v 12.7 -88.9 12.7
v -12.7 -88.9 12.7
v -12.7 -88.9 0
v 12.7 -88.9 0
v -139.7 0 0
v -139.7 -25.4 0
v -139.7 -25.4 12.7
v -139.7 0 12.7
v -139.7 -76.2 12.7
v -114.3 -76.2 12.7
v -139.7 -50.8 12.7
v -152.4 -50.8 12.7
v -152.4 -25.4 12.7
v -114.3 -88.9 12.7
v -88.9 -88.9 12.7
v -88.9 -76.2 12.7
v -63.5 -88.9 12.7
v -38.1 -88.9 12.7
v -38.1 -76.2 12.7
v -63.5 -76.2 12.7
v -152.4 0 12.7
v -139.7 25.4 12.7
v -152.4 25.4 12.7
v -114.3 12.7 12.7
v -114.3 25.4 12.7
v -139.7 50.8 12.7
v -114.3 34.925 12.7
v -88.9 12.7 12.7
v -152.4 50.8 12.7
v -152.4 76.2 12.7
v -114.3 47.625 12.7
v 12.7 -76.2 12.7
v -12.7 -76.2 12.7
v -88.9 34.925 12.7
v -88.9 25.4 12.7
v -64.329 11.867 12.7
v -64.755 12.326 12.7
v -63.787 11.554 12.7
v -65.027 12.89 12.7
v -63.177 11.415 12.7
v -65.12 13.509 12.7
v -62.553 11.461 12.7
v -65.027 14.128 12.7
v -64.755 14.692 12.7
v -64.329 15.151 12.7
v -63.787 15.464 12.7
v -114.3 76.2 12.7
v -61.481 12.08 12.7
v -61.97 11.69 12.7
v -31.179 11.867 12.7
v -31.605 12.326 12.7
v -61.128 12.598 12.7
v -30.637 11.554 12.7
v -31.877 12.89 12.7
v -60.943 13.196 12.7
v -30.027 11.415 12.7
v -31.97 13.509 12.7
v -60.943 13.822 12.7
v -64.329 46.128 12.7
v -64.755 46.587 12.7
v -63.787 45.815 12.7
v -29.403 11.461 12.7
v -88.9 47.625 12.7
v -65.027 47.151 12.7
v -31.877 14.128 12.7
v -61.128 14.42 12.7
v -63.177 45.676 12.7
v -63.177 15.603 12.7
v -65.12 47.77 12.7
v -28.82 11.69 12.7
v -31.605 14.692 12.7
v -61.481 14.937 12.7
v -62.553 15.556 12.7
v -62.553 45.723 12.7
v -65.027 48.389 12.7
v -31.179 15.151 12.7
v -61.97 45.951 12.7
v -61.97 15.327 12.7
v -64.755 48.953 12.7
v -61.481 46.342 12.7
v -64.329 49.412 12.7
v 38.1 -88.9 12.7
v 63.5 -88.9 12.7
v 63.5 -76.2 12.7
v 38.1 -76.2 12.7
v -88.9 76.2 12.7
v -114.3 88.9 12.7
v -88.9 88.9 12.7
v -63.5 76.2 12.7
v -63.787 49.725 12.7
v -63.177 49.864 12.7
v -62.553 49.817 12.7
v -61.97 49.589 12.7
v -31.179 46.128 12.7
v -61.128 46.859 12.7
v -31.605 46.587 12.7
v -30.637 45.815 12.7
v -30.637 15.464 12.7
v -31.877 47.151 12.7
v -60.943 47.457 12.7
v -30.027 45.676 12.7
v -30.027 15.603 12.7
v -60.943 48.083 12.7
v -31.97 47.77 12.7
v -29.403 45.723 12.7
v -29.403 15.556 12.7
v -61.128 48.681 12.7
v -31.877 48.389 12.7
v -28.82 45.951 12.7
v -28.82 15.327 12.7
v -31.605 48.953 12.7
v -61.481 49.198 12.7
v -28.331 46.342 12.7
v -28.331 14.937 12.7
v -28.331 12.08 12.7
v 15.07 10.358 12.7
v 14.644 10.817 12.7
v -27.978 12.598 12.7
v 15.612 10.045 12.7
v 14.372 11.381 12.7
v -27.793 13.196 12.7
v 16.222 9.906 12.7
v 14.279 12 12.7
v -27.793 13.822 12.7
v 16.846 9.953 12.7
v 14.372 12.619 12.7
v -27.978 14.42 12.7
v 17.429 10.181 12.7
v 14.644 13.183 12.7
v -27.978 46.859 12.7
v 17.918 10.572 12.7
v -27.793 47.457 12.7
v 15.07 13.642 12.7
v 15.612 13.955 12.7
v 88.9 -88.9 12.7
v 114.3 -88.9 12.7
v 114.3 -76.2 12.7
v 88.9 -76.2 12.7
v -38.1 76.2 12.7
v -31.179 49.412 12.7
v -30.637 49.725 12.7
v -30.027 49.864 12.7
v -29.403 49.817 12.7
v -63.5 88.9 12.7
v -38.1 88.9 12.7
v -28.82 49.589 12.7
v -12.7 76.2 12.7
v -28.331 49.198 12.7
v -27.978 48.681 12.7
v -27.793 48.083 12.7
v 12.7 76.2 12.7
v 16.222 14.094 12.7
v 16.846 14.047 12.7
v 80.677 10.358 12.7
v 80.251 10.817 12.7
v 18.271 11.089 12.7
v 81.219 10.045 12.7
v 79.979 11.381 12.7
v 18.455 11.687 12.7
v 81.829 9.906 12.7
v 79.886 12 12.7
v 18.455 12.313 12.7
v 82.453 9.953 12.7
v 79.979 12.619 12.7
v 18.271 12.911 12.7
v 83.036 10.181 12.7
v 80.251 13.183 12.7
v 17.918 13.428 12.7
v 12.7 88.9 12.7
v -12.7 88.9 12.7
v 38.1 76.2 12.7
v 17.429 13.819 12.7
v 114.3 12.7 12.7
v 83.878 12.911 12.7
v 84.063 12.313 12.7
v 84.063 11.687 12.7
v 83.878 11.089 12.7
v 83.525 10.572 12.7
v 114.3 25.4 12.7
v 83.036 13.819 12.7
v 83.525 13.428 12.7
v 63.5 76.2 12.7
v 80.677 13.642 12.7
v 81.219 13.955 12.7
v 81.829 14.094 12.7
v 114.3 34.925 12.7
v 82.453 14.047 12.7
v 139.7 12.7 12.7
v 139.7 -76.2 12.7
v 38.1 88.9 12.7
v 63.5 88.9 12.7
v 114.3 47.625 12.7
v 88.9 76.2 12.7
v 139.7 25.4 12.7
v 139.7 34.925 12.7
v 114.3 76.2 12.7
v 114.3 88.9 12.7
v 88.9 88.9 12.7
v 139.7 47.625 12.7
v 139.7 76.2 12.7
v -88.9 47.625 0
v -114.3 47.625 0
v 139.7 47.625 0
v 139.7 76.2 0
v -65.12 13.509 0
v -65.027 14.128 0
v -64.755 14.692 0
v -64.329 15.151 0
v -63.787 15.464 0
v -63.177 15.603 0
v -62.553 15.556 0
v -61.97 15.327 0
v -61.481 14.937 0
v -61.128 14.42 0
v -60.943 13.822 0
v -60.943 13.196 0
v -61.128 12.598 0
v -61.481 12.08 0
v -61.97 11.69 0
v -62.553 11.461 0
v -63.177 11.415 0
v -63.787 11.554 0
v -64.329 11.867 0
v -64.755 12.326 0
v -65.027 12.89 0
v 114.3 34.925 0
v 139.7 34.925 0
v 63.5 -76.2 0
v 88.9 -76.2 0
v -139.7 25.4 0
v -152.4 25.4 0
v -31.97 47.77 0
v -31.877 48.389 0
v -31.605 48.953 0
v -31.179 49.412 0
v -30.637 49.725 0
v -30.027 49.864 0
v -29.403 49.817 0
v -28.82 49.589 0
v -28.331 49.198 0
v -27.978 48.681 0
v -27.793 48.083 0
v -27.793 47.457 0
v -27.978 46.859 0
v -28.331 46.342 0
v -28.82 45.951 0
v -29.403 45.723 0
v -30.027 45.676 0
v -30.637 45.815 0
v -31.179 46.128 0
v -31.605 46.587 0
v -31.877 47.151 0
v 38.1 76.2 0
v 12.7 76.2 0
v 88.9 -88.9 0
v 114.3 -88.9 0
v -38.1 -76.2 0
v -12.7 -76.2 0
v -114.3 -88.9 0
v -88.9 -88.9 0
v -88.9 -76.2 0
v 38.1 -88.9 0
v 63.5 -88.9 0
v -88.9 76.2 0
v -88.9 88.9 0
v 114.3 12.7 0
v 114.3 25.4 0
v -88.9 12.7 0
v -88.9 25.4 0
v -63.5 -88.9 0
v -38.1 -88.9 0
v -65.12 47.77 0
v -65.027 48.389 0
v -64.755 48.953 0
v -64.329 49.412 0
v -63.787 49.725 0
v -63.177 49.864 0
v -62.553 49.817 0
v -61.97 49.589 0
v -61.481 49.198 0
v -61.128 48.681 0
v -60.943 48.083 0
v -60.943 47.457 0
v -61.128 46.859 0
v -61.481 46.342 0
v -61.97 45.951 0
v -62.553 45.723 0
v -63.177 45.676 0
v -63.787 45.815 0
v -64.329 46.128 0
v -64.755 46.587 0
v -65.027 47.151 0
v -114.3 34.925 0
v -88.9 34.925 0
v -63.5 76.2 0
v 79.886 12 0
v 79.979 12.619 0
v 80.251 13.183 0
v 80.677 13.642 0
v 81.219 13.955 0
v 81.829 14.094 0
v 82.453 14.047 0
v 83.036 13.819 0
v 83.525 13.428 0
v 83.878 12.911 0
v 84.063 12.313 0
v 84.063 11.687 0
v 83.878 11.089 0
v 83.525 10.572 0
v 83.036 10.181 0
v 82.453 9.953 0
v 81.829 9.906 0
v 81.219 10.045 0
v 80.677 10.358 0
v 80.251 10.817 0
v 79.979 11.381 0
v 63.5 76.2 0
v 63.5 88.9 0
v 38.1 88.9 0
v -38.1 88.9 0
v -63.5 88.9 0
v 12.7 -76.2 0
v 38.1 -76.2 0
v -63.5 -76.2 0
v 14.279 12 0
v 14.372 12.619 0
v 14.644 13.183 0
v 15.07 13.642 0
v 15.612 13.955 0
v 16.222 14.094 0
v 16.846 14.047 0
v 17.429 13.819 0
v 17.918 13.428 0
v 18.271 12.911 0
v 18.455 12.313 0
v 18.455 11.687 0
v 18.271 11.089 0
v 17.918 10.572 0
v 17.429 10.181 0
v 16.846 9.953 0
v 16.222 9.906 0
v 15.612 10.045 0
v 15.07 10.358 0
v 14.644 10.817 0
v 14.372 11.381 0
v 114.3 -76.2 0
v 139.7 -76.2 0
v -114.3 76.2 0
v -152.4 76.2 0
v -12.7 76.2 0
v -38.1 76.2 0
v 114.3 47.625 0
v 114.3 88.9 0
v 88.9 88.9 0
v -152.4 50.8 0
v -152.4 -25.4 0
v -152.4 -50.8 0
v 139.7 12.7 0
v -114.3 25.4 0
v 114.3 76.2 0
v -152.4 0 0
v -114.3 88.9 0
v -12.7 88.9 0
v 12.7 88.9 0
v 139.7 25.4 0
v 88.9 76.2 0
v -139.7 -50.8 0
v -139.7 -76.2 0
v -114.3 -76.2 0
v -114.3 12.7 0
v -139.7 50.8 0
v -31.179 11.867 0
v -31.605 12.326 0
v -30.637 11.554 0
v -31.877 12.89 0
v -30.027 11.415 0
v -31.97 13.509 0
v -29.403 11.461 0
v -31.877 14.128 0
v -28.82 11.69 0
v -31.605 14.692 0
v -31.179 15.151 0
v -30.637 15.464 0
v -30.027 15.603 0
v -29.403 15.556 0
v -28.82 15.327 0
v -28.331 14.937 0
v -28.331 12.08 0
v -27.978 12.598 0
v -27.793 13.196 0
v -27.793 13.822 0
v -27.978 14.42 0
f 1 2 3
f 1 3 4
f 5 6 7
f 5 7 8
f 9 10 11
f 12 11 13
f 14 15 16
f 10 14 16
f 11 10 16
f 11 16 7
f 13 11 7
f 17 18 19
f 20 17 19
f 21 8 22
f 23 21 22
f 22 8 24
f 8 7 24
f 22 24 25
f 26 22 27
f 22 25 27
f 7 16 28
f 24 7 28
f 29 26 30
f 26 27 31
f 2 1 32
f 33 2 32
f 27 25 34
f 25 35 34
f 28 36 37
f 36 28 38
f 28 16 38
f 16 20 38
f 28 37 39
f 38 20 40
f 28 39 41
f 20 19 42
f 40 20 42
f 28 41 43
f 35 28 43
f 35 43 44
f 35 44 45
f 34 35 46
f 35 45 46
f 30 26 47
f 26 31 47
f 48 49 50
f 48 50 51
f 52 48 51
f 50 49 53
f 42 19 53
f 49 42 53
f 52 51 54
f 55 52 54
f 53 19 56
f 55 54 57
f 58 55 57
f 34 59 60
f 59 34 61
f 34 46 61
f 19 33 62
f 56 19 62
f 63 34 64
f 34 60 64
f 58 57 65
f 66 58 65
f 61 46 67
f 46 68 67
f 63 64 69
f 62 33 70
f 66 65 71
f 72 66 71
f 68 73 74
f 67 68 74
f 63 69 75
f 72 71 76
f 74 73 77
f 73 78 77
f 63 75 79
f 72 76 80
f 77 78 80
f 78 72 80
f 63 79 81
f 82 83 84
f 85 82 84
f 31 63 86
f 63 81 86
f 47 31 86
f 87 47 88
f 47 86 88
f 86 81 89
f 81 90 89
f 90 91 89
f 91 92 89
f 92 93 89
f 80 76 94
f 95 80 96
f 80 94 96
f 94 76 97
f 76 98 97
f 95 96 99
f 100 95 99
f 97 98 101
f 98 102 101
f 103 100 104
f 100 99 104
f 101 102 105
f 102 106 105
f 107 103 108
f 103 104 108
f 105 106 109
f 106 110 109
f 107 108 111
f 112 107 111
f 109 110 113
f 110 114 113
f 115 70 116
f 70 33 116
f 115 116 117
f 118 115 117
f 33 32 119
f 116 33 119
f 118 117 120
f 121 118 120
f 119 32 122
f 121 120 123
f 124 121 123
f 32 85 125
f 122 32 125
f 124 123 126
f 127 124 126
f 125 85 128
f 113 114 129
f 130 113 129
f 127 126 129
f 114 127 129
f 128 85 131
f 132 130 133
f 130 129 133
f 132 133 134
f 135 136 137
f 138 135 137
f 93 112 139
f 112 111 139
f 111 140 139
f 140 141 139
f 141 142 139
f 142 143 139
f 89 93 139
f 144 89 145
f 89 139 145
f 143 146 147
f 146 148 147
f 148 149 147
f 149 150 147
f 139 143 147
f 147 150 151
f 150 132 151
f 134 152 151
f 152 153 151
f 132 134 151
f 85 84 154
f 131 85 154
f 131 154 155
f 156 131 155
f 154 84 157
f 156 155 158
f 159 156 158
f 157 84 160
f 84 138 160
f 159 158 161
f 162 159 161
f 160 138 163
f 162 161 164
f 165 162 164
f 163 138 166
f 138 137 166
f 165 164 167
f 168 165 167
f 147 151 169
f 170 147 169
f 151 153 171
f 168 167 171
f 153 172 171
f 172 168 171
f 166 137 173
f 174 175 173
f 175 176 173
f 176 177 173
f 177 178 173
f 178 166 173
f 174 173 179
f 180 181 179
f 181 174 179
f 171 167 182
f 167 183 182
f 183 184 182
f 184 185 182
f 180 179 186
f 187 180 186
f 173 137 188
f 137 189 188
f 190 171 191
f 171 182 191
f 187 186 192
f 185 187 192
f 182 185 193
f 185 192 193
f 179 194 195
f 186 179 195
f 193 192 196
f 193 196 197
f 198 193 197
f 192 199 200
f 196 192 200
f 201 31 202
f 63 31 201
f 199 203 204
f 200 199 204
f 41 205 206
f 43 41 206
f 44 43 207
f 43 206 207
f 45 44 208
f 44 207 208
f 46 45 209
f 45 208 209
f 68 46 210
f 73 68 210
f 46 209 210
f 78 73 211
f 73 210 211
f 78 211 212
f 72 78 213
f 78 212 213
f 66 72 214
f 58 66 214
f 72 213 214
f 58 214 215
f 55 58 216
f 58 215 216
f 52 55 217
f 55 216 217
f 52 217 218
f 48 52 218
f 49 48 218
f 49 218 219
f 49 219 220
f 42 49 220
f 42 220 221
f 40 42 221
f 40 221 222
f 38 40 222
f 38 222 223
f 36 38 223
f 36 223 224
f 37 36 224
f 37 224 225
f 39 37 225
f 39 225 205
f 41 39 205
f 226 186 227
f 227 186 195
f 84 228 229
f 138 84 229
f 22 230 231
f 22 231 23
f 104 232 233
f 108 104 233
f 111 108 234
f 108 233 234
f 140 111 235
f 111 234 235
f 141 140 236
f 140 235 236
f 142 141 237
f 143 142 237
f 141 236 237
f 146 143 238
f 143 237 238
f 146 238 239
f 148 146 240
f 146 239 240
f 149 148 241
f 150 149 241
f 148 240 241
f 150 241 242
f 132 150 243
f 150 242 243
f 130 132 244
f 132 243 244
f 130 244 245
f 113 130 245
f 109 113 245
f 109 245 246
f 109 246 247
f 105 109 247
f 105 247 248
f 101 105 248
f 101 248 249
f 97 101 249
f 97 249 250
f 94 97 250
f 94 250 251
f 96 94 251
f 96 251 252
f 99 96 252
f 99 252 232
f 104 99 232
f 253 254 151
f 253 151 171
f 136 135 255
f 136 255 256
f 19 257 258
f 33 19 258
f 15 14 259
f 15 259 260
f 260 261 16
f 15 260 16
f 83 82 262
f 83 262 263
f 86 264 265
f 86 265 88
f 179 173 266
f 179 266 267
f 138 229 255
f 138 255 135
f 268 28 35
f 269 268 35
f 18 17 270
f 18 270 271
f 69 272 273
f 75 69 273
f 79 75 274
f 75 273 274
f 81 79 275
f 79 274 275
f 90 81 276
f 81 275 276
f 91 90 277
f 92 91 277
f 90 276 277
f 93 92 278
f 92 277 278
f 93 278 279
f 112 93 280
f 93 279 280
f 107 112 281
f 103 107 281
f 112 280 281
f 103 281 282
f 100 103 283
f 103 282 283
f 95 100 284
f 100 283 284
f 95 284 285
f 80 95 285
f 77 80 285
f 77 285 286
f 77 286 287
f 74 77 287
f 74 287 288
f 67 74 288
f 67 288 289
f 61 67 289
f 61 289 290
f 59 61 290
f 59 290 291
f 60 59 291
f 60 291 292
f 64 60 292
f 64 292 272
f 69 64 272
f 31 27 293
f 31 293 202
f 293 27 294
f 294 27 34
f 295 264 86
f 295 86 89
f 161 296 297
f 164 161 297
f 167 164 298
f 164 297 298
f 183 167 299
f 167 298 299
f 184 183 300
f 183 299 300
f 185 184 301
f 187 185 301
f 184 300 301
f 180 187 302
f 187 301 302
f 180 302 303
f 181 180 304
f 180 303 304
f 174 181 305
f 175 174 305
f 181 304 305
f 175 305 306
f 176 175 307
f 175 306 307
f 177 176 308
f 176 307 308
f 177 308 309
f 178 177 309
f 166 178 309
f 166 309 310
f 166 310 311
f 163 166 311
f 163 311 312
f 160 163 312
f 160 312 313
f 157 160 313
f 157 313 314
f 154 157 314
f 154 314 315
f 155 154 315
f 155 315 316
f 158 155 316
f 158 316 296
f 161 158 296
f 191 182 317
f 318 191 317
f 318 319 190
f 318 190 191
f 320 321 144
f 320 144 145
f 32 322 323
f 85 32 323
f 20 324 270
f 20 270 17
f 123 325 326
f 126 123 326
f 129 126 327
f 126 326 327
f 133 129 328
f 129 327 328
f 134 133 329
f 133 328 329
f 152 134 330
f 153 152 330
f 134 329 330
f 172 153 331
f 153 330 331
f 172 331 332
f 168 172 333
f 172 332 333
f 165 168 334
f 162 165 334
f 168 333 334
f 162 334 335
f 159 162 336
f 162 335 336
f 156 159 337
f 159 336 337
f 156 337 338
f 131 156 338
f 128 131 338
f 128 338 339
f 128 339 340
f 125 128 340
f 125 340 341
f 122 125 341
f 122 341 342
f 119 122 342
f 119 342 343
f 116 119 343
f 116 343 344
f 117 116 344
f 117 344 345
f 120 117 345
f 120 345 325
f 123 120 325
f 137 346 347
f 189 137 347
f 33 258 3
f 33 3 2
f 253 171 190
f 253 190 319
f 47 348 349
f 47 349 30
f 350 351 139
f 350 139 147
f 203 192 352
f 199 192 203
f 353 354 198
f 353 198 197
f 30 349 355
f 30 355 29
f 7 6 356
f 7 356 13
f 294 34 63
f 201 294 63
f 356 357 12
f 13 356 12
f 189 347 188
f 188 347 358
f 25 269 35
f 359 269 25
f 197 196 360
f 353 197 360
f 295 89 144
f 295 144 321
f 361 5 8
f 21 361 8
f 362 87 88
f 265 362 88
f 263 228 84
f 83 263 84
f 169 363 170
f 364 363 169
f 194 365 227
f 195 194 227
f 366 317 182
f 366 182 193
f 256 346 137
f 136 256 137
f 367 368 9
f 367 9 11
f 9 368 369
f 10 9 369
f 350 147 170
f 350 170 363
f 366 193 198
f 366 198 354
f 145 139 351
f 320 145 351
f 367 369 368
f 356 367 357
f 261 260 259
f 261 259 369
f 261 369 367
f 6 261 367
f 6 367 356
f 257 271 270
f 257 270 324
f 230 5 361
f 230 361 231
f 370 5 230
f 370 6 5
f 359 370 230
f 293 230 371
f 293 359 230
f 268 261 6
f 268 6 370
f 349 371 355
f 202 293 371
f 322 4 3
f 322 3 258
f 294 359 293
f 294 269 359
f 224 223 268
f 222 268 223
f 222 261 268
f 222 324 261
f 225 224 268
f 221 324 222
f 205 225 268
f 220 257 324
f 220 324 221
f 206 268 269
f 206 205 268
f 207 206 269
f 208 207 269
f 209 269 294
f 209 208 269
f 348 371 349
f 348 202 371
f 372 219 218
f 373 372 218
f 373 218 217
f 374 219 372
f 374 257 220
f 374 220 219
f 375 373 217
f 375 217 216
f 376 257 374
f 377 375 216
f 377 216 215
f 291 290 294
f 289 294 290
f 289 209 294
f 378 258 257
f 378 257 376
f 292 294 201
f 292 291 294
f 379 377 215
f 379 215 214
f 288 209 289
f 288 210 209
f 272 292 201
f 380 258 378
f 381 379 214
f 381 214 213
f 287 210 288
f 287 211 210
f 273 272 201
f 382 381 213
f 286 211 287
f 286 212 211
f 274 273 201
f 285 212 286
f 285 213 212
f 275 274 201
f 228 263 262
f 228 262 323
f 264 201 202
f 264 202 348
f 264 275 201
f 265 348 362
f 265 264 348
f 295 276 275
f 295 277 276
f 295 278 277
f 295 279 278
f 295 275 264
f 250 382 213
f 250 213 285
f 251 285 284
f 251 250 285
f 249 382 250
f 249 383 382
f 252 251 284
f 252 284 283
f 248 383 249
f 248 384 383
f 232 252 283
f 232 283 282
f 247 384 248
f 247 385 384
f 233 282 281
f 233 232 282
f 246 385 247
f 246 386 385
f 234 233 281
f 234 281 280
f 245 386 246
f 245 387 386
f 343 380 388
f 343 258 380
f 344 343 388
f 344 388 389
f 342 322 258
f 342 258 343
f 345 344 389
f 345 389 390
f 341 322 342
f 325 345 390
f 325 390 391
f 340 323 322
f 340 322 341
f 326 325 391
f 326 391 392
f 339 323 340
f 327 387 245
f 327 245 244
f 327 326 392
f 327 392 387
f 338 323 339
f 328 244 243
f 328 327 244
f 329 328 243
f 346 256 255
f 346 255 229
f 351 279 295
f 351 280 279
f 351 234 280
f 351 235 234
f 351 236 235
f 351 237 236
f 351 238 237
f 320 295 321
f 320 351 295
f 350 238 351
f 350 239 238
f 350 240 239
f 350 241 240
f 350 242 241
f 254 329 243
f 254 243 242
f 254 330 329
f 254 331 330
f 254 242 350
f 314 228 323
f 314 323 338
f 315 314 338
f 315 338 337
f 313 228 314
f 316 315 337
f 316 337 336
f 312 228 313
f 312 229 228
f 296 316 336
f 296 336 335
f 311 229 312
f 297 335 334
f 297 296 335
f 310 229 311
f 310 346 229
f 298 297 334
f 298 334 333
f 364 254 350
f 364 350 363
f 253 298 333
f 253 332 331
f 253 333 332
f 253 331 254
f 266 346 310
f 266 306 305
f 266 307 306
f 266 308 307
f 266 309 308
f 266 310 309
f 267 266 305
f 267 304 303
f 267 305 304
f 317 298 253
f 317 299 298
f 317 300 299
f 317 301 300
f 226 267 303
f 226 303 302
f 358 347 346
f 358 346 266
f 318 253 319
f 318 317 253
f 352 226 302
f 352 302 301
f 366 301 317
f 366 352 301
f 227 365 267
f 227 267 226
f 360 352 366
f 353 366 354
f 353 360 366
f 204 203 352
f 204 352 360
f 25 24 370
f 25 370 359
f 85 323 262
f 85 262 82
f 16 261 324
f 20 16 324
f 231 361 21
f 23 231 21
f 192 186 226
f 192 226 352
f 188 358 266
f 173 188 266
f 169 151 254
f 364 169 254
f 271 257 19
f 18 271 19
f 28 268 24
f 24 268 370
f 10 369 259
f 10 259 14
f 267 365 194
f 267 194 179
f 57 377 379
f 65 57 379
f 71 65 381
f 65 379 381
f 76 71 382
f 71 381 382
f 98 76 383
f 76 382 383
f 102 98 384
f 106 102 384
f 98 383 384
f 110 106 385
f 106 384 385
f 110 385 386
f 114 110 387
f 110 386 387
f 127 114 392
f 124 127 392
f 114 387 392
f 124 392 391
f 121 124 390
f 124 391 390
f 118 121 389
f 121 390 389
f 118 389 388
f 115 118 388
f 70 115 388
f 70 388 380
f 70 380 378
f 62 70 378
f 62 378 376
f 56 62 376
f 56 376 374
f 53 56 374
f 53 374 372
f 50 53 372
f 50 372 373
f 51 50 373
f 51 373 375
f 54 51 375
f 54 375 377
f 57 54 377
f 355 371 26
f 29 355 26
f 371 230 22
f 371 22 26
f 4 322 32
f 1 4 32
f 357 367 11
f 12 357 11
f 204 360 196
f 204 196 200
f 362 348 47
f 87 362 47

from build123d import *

# Parameters (mm, degrees)
SKETCH1_W               = 279.4
SKETCH1_H               = 152.4
BOSS_EXTRUDE1_DEPTH     = 12.7
SKETCH2_W               = 25.4
SKETCH2_H               = 12.7
BOSS_EXTRUDE2_DEPTH     = 12.7
LPATTERN1_COUNT         = 5
LPATTERN1_PITCH         = 50.8
MIRROR1_COPY_1_SKETCH_W = 25.4
MIRROR1_COPY_1_SKETCH_H = 12.7
MIRROR1_COPY_1_DEPTH    = 12.7
MIRROR1_COPY_2_SKETCH_W = 25.4
MIRROR1_COPY_2_SKETCH_H = 12.7
MIRROR1_COPY_2_DEPTH    = 12.7
MIRROR1_COPY_3_SKETCH_W = 25.4
MIRROR1_COPY_3_SKETCH_H = 12.7
MIRROR1_COPY_3_DEPTH    = 12.7
MIRROR1_COPY_4_SKETCH_W = 25.4
MIRROR1_COPY_4_SKETCH_H = 12.7
MIRROR1_COPY_4_DEPTH    = 12.7
SKETCH3_W               = 12.7
SKETCH3_H               = 25.4
BOSS_EXTRUDE3_DEPTH     = 12.7
LPATTERN2_COUNT         = 3
LPATTERN2_PITCH         = 50.8
SKETCH4_W               = 25.4
SKETCH4_H               = 12.7
CUT_EXTRUDE1_DEPTH      = 13.7
LPATTERN3_COUNT         = 2
LPATTERN3_PITCH         = 228.6
SKETCH5_W               = 25.4
SKETCH5_H               = 12.7
CUT_EXTRUDE2_DEPTH      = 13.7
LPATTERN4_COUNT         = 2
LPATTERN4_PITCH         = 228.6
SKETCH6_R               = 2.1
CUT_EXTRUDE3_DEPTH      = 13.7


with BuildPart() as part:
    # Sketch1 → Boss-Extrude1 (new body)
    with BuildSketch(Plane.XY):
        Rectangle(SKETCH1_W, SKETCH1_H)
    extrude(amount=BOSS_EXTRUDE1_DEPTH)

    # Sketch2 → Boss-Extrude2 (add)
    with BuildSketch(Plane.XZ.offset(76.2)):
        with Locations((-101.6, 6.35)):
            Rectangle(SKETCH2_W, SKETCH2_H)
    boss_extrude2 = extrude(amount=BOSS_EXTRUDE2_DEPTH)

    # LPattern1: Boss-Extrude2 ×5
    with Locations(*[(i * LPATTERN1_PITCH, 0, 0) for i in range(1, LPATTERN1_COUNT)]):
        add(boss_extrude2)

    # Mirror1: Boss-Extrude2 across plane
    add(boss_extrude2.mirror(Plane.ZX))

    # Mirror1 copy 1 sketch → Mirror1 copy 1 (add)
    with BuildSketch(Plane(origin=(50.8, 76.2, 0), x_dir=(1, 0, 0), z_dir=(0, 1, 0))):
        with Locations((-101.6, -6.35)):
            Rectangle(MIRROR1_COPY_1_SKETCH_W, MIRROR1_COPY_1_SKETCH_H)
    extrude(amount=MIRROR1_COPY_1_DEPTH)

    # Mirror1 copy 2 sketch → Mirror1 copy 2 (add)
    with BuildSketch(Plane(origin=(101.6, 76.2, 0), x_dir=(1, 0, 0), z_dir=(0, 1, 0))):
        with Locations((-101.6, -6.35)):
            Rectangle(MIRROR1_COPY_2_SKETCH_W, MIRROR1_COPY_2_SKETCH_H)
    extrude(amount=MIRROR1_COPY_2_DEPTH)

    # Mirror1 copy 3 sketch → Mirror1 copy 3 (add)
    with BuildSketch(Plane(origin=(152.4, 76.2, 0), x_dir=(1, 0, 0), z_dir=(0, 1, 0))):
        with Locations((-101.6, -6.35)):
            Rectangle(MIRROR1_COPY_3_SKETCH_W, MIRROR1_COPY_3_SKETCH_H)
    extrude(amount=MIRROR1_COPY_3_DEPTH)

    # Mirror1 copy 4 sketch → Mirror1 copy 4 (add)
    with BuildSketch(Plane(origin=(203.2, 76.2, 0), x_dir=(1, 0, 0), z_dir=(0, 1, 0))):
        with Locations((-101.6, -6.35)):
            Rectangle(MIRROR1_COPY_4_SKETCH_W, MIRROR1_COPY_4_SKETCH_H)
    extrude(amount=MIRROR1_COPY_4_DEPTH)

    # Sketch3 → Boss-Extrude3 (add)
    with BuildSketch(Plane.ZY.offset(139.7)):
        with Locations((6.35, 63.5)):
            Rectangle(SKETCH3_W, SKETCH3_H)
    boss_extrude3 = extrude(amount=BOSS_EXTRUDE3_DEPTH)

    # LPattern2: Boss-Extrude3 ×3
    with Locations(*[(0, -i * LPATTERN2_PITCH, 0) for i in range(1, LPATTERN2_COUNT)]):
        add(boss_extrude3)

    # Sketch4 → Cut-Extrude1 (cut, through all)
    with BuildSketch(Plane(origin=(0, 0, 0), x_dir=(-1, 0, 0), z_dir=(0, 0, -1))):
        with Locations((-127, 19.05)):
            Rectangle(SKETCH4_W, SKETCH4_H)
    cut_extrude1 = extrude(amount=-CUT_EXTRUDE1_DEPTH, mode=Mode.SUBTRACT)

    # LPattern3: Cut-Extrude1 ×2
    with Locations(*[(-i * LPATTERN3_PITCH, 0, 0) for i in range(1, LPATTERN3_COUNT)]):
        add(cut_extrude1, mode=Mode.SUBTRACT)

    # Sketch5 → Cut-Extrude2 (cut, through all)
    with BuildSketch(Plane.XY.offset(12.7)):
        with Locations((-101.6, 41.275)):
            Rectangle(SKETCH5_W, SKETCH5_H)
    cut_extrude2 = extrude(amount=-CUT_EXTRUDE2_DEPTH, mode=Mode.SUBTRACT)

    # LPattern4: Cut-Extrude2 ×2
    with Locations(*[(i * LPATTERN4_PITCH, 0, 0) for i in range(1, LPATTERN4_COUNT)]):
        add(cut_extrude2, mode=Mode.SUBTRACT)

    # Sketch6 → Cut-Extrude3 (cut, through all)
    with BuildSketch(Plane(origin=(0, 0, 0), x_dir=(-1, 0, 0), z_dir=(0, 0, -1))):
        with Locations((-81.986081859, 12)):
            Circle(SKETCH6_R)
        with Locations((-16.378881859, 12)):
            Circle(SKETCH6_R)
        with Locations((63.020004141, 13.50877)):
            Circle(SKETCH6_R)
        with Locations((29.870004141, 47.77)):
            Circle(SKETCH6_R)
        with Locations((63.020004141, 47.77)):
            Circle(SKETCH6_R)
        with Locations((29.870004141, 13.50877)):
            Circle(SKETCH6_R)
    extrude(amount=-CUT_EXTRUDE3_DEPTH, mode=Mode.SUBTRACT)


solid = part.part
